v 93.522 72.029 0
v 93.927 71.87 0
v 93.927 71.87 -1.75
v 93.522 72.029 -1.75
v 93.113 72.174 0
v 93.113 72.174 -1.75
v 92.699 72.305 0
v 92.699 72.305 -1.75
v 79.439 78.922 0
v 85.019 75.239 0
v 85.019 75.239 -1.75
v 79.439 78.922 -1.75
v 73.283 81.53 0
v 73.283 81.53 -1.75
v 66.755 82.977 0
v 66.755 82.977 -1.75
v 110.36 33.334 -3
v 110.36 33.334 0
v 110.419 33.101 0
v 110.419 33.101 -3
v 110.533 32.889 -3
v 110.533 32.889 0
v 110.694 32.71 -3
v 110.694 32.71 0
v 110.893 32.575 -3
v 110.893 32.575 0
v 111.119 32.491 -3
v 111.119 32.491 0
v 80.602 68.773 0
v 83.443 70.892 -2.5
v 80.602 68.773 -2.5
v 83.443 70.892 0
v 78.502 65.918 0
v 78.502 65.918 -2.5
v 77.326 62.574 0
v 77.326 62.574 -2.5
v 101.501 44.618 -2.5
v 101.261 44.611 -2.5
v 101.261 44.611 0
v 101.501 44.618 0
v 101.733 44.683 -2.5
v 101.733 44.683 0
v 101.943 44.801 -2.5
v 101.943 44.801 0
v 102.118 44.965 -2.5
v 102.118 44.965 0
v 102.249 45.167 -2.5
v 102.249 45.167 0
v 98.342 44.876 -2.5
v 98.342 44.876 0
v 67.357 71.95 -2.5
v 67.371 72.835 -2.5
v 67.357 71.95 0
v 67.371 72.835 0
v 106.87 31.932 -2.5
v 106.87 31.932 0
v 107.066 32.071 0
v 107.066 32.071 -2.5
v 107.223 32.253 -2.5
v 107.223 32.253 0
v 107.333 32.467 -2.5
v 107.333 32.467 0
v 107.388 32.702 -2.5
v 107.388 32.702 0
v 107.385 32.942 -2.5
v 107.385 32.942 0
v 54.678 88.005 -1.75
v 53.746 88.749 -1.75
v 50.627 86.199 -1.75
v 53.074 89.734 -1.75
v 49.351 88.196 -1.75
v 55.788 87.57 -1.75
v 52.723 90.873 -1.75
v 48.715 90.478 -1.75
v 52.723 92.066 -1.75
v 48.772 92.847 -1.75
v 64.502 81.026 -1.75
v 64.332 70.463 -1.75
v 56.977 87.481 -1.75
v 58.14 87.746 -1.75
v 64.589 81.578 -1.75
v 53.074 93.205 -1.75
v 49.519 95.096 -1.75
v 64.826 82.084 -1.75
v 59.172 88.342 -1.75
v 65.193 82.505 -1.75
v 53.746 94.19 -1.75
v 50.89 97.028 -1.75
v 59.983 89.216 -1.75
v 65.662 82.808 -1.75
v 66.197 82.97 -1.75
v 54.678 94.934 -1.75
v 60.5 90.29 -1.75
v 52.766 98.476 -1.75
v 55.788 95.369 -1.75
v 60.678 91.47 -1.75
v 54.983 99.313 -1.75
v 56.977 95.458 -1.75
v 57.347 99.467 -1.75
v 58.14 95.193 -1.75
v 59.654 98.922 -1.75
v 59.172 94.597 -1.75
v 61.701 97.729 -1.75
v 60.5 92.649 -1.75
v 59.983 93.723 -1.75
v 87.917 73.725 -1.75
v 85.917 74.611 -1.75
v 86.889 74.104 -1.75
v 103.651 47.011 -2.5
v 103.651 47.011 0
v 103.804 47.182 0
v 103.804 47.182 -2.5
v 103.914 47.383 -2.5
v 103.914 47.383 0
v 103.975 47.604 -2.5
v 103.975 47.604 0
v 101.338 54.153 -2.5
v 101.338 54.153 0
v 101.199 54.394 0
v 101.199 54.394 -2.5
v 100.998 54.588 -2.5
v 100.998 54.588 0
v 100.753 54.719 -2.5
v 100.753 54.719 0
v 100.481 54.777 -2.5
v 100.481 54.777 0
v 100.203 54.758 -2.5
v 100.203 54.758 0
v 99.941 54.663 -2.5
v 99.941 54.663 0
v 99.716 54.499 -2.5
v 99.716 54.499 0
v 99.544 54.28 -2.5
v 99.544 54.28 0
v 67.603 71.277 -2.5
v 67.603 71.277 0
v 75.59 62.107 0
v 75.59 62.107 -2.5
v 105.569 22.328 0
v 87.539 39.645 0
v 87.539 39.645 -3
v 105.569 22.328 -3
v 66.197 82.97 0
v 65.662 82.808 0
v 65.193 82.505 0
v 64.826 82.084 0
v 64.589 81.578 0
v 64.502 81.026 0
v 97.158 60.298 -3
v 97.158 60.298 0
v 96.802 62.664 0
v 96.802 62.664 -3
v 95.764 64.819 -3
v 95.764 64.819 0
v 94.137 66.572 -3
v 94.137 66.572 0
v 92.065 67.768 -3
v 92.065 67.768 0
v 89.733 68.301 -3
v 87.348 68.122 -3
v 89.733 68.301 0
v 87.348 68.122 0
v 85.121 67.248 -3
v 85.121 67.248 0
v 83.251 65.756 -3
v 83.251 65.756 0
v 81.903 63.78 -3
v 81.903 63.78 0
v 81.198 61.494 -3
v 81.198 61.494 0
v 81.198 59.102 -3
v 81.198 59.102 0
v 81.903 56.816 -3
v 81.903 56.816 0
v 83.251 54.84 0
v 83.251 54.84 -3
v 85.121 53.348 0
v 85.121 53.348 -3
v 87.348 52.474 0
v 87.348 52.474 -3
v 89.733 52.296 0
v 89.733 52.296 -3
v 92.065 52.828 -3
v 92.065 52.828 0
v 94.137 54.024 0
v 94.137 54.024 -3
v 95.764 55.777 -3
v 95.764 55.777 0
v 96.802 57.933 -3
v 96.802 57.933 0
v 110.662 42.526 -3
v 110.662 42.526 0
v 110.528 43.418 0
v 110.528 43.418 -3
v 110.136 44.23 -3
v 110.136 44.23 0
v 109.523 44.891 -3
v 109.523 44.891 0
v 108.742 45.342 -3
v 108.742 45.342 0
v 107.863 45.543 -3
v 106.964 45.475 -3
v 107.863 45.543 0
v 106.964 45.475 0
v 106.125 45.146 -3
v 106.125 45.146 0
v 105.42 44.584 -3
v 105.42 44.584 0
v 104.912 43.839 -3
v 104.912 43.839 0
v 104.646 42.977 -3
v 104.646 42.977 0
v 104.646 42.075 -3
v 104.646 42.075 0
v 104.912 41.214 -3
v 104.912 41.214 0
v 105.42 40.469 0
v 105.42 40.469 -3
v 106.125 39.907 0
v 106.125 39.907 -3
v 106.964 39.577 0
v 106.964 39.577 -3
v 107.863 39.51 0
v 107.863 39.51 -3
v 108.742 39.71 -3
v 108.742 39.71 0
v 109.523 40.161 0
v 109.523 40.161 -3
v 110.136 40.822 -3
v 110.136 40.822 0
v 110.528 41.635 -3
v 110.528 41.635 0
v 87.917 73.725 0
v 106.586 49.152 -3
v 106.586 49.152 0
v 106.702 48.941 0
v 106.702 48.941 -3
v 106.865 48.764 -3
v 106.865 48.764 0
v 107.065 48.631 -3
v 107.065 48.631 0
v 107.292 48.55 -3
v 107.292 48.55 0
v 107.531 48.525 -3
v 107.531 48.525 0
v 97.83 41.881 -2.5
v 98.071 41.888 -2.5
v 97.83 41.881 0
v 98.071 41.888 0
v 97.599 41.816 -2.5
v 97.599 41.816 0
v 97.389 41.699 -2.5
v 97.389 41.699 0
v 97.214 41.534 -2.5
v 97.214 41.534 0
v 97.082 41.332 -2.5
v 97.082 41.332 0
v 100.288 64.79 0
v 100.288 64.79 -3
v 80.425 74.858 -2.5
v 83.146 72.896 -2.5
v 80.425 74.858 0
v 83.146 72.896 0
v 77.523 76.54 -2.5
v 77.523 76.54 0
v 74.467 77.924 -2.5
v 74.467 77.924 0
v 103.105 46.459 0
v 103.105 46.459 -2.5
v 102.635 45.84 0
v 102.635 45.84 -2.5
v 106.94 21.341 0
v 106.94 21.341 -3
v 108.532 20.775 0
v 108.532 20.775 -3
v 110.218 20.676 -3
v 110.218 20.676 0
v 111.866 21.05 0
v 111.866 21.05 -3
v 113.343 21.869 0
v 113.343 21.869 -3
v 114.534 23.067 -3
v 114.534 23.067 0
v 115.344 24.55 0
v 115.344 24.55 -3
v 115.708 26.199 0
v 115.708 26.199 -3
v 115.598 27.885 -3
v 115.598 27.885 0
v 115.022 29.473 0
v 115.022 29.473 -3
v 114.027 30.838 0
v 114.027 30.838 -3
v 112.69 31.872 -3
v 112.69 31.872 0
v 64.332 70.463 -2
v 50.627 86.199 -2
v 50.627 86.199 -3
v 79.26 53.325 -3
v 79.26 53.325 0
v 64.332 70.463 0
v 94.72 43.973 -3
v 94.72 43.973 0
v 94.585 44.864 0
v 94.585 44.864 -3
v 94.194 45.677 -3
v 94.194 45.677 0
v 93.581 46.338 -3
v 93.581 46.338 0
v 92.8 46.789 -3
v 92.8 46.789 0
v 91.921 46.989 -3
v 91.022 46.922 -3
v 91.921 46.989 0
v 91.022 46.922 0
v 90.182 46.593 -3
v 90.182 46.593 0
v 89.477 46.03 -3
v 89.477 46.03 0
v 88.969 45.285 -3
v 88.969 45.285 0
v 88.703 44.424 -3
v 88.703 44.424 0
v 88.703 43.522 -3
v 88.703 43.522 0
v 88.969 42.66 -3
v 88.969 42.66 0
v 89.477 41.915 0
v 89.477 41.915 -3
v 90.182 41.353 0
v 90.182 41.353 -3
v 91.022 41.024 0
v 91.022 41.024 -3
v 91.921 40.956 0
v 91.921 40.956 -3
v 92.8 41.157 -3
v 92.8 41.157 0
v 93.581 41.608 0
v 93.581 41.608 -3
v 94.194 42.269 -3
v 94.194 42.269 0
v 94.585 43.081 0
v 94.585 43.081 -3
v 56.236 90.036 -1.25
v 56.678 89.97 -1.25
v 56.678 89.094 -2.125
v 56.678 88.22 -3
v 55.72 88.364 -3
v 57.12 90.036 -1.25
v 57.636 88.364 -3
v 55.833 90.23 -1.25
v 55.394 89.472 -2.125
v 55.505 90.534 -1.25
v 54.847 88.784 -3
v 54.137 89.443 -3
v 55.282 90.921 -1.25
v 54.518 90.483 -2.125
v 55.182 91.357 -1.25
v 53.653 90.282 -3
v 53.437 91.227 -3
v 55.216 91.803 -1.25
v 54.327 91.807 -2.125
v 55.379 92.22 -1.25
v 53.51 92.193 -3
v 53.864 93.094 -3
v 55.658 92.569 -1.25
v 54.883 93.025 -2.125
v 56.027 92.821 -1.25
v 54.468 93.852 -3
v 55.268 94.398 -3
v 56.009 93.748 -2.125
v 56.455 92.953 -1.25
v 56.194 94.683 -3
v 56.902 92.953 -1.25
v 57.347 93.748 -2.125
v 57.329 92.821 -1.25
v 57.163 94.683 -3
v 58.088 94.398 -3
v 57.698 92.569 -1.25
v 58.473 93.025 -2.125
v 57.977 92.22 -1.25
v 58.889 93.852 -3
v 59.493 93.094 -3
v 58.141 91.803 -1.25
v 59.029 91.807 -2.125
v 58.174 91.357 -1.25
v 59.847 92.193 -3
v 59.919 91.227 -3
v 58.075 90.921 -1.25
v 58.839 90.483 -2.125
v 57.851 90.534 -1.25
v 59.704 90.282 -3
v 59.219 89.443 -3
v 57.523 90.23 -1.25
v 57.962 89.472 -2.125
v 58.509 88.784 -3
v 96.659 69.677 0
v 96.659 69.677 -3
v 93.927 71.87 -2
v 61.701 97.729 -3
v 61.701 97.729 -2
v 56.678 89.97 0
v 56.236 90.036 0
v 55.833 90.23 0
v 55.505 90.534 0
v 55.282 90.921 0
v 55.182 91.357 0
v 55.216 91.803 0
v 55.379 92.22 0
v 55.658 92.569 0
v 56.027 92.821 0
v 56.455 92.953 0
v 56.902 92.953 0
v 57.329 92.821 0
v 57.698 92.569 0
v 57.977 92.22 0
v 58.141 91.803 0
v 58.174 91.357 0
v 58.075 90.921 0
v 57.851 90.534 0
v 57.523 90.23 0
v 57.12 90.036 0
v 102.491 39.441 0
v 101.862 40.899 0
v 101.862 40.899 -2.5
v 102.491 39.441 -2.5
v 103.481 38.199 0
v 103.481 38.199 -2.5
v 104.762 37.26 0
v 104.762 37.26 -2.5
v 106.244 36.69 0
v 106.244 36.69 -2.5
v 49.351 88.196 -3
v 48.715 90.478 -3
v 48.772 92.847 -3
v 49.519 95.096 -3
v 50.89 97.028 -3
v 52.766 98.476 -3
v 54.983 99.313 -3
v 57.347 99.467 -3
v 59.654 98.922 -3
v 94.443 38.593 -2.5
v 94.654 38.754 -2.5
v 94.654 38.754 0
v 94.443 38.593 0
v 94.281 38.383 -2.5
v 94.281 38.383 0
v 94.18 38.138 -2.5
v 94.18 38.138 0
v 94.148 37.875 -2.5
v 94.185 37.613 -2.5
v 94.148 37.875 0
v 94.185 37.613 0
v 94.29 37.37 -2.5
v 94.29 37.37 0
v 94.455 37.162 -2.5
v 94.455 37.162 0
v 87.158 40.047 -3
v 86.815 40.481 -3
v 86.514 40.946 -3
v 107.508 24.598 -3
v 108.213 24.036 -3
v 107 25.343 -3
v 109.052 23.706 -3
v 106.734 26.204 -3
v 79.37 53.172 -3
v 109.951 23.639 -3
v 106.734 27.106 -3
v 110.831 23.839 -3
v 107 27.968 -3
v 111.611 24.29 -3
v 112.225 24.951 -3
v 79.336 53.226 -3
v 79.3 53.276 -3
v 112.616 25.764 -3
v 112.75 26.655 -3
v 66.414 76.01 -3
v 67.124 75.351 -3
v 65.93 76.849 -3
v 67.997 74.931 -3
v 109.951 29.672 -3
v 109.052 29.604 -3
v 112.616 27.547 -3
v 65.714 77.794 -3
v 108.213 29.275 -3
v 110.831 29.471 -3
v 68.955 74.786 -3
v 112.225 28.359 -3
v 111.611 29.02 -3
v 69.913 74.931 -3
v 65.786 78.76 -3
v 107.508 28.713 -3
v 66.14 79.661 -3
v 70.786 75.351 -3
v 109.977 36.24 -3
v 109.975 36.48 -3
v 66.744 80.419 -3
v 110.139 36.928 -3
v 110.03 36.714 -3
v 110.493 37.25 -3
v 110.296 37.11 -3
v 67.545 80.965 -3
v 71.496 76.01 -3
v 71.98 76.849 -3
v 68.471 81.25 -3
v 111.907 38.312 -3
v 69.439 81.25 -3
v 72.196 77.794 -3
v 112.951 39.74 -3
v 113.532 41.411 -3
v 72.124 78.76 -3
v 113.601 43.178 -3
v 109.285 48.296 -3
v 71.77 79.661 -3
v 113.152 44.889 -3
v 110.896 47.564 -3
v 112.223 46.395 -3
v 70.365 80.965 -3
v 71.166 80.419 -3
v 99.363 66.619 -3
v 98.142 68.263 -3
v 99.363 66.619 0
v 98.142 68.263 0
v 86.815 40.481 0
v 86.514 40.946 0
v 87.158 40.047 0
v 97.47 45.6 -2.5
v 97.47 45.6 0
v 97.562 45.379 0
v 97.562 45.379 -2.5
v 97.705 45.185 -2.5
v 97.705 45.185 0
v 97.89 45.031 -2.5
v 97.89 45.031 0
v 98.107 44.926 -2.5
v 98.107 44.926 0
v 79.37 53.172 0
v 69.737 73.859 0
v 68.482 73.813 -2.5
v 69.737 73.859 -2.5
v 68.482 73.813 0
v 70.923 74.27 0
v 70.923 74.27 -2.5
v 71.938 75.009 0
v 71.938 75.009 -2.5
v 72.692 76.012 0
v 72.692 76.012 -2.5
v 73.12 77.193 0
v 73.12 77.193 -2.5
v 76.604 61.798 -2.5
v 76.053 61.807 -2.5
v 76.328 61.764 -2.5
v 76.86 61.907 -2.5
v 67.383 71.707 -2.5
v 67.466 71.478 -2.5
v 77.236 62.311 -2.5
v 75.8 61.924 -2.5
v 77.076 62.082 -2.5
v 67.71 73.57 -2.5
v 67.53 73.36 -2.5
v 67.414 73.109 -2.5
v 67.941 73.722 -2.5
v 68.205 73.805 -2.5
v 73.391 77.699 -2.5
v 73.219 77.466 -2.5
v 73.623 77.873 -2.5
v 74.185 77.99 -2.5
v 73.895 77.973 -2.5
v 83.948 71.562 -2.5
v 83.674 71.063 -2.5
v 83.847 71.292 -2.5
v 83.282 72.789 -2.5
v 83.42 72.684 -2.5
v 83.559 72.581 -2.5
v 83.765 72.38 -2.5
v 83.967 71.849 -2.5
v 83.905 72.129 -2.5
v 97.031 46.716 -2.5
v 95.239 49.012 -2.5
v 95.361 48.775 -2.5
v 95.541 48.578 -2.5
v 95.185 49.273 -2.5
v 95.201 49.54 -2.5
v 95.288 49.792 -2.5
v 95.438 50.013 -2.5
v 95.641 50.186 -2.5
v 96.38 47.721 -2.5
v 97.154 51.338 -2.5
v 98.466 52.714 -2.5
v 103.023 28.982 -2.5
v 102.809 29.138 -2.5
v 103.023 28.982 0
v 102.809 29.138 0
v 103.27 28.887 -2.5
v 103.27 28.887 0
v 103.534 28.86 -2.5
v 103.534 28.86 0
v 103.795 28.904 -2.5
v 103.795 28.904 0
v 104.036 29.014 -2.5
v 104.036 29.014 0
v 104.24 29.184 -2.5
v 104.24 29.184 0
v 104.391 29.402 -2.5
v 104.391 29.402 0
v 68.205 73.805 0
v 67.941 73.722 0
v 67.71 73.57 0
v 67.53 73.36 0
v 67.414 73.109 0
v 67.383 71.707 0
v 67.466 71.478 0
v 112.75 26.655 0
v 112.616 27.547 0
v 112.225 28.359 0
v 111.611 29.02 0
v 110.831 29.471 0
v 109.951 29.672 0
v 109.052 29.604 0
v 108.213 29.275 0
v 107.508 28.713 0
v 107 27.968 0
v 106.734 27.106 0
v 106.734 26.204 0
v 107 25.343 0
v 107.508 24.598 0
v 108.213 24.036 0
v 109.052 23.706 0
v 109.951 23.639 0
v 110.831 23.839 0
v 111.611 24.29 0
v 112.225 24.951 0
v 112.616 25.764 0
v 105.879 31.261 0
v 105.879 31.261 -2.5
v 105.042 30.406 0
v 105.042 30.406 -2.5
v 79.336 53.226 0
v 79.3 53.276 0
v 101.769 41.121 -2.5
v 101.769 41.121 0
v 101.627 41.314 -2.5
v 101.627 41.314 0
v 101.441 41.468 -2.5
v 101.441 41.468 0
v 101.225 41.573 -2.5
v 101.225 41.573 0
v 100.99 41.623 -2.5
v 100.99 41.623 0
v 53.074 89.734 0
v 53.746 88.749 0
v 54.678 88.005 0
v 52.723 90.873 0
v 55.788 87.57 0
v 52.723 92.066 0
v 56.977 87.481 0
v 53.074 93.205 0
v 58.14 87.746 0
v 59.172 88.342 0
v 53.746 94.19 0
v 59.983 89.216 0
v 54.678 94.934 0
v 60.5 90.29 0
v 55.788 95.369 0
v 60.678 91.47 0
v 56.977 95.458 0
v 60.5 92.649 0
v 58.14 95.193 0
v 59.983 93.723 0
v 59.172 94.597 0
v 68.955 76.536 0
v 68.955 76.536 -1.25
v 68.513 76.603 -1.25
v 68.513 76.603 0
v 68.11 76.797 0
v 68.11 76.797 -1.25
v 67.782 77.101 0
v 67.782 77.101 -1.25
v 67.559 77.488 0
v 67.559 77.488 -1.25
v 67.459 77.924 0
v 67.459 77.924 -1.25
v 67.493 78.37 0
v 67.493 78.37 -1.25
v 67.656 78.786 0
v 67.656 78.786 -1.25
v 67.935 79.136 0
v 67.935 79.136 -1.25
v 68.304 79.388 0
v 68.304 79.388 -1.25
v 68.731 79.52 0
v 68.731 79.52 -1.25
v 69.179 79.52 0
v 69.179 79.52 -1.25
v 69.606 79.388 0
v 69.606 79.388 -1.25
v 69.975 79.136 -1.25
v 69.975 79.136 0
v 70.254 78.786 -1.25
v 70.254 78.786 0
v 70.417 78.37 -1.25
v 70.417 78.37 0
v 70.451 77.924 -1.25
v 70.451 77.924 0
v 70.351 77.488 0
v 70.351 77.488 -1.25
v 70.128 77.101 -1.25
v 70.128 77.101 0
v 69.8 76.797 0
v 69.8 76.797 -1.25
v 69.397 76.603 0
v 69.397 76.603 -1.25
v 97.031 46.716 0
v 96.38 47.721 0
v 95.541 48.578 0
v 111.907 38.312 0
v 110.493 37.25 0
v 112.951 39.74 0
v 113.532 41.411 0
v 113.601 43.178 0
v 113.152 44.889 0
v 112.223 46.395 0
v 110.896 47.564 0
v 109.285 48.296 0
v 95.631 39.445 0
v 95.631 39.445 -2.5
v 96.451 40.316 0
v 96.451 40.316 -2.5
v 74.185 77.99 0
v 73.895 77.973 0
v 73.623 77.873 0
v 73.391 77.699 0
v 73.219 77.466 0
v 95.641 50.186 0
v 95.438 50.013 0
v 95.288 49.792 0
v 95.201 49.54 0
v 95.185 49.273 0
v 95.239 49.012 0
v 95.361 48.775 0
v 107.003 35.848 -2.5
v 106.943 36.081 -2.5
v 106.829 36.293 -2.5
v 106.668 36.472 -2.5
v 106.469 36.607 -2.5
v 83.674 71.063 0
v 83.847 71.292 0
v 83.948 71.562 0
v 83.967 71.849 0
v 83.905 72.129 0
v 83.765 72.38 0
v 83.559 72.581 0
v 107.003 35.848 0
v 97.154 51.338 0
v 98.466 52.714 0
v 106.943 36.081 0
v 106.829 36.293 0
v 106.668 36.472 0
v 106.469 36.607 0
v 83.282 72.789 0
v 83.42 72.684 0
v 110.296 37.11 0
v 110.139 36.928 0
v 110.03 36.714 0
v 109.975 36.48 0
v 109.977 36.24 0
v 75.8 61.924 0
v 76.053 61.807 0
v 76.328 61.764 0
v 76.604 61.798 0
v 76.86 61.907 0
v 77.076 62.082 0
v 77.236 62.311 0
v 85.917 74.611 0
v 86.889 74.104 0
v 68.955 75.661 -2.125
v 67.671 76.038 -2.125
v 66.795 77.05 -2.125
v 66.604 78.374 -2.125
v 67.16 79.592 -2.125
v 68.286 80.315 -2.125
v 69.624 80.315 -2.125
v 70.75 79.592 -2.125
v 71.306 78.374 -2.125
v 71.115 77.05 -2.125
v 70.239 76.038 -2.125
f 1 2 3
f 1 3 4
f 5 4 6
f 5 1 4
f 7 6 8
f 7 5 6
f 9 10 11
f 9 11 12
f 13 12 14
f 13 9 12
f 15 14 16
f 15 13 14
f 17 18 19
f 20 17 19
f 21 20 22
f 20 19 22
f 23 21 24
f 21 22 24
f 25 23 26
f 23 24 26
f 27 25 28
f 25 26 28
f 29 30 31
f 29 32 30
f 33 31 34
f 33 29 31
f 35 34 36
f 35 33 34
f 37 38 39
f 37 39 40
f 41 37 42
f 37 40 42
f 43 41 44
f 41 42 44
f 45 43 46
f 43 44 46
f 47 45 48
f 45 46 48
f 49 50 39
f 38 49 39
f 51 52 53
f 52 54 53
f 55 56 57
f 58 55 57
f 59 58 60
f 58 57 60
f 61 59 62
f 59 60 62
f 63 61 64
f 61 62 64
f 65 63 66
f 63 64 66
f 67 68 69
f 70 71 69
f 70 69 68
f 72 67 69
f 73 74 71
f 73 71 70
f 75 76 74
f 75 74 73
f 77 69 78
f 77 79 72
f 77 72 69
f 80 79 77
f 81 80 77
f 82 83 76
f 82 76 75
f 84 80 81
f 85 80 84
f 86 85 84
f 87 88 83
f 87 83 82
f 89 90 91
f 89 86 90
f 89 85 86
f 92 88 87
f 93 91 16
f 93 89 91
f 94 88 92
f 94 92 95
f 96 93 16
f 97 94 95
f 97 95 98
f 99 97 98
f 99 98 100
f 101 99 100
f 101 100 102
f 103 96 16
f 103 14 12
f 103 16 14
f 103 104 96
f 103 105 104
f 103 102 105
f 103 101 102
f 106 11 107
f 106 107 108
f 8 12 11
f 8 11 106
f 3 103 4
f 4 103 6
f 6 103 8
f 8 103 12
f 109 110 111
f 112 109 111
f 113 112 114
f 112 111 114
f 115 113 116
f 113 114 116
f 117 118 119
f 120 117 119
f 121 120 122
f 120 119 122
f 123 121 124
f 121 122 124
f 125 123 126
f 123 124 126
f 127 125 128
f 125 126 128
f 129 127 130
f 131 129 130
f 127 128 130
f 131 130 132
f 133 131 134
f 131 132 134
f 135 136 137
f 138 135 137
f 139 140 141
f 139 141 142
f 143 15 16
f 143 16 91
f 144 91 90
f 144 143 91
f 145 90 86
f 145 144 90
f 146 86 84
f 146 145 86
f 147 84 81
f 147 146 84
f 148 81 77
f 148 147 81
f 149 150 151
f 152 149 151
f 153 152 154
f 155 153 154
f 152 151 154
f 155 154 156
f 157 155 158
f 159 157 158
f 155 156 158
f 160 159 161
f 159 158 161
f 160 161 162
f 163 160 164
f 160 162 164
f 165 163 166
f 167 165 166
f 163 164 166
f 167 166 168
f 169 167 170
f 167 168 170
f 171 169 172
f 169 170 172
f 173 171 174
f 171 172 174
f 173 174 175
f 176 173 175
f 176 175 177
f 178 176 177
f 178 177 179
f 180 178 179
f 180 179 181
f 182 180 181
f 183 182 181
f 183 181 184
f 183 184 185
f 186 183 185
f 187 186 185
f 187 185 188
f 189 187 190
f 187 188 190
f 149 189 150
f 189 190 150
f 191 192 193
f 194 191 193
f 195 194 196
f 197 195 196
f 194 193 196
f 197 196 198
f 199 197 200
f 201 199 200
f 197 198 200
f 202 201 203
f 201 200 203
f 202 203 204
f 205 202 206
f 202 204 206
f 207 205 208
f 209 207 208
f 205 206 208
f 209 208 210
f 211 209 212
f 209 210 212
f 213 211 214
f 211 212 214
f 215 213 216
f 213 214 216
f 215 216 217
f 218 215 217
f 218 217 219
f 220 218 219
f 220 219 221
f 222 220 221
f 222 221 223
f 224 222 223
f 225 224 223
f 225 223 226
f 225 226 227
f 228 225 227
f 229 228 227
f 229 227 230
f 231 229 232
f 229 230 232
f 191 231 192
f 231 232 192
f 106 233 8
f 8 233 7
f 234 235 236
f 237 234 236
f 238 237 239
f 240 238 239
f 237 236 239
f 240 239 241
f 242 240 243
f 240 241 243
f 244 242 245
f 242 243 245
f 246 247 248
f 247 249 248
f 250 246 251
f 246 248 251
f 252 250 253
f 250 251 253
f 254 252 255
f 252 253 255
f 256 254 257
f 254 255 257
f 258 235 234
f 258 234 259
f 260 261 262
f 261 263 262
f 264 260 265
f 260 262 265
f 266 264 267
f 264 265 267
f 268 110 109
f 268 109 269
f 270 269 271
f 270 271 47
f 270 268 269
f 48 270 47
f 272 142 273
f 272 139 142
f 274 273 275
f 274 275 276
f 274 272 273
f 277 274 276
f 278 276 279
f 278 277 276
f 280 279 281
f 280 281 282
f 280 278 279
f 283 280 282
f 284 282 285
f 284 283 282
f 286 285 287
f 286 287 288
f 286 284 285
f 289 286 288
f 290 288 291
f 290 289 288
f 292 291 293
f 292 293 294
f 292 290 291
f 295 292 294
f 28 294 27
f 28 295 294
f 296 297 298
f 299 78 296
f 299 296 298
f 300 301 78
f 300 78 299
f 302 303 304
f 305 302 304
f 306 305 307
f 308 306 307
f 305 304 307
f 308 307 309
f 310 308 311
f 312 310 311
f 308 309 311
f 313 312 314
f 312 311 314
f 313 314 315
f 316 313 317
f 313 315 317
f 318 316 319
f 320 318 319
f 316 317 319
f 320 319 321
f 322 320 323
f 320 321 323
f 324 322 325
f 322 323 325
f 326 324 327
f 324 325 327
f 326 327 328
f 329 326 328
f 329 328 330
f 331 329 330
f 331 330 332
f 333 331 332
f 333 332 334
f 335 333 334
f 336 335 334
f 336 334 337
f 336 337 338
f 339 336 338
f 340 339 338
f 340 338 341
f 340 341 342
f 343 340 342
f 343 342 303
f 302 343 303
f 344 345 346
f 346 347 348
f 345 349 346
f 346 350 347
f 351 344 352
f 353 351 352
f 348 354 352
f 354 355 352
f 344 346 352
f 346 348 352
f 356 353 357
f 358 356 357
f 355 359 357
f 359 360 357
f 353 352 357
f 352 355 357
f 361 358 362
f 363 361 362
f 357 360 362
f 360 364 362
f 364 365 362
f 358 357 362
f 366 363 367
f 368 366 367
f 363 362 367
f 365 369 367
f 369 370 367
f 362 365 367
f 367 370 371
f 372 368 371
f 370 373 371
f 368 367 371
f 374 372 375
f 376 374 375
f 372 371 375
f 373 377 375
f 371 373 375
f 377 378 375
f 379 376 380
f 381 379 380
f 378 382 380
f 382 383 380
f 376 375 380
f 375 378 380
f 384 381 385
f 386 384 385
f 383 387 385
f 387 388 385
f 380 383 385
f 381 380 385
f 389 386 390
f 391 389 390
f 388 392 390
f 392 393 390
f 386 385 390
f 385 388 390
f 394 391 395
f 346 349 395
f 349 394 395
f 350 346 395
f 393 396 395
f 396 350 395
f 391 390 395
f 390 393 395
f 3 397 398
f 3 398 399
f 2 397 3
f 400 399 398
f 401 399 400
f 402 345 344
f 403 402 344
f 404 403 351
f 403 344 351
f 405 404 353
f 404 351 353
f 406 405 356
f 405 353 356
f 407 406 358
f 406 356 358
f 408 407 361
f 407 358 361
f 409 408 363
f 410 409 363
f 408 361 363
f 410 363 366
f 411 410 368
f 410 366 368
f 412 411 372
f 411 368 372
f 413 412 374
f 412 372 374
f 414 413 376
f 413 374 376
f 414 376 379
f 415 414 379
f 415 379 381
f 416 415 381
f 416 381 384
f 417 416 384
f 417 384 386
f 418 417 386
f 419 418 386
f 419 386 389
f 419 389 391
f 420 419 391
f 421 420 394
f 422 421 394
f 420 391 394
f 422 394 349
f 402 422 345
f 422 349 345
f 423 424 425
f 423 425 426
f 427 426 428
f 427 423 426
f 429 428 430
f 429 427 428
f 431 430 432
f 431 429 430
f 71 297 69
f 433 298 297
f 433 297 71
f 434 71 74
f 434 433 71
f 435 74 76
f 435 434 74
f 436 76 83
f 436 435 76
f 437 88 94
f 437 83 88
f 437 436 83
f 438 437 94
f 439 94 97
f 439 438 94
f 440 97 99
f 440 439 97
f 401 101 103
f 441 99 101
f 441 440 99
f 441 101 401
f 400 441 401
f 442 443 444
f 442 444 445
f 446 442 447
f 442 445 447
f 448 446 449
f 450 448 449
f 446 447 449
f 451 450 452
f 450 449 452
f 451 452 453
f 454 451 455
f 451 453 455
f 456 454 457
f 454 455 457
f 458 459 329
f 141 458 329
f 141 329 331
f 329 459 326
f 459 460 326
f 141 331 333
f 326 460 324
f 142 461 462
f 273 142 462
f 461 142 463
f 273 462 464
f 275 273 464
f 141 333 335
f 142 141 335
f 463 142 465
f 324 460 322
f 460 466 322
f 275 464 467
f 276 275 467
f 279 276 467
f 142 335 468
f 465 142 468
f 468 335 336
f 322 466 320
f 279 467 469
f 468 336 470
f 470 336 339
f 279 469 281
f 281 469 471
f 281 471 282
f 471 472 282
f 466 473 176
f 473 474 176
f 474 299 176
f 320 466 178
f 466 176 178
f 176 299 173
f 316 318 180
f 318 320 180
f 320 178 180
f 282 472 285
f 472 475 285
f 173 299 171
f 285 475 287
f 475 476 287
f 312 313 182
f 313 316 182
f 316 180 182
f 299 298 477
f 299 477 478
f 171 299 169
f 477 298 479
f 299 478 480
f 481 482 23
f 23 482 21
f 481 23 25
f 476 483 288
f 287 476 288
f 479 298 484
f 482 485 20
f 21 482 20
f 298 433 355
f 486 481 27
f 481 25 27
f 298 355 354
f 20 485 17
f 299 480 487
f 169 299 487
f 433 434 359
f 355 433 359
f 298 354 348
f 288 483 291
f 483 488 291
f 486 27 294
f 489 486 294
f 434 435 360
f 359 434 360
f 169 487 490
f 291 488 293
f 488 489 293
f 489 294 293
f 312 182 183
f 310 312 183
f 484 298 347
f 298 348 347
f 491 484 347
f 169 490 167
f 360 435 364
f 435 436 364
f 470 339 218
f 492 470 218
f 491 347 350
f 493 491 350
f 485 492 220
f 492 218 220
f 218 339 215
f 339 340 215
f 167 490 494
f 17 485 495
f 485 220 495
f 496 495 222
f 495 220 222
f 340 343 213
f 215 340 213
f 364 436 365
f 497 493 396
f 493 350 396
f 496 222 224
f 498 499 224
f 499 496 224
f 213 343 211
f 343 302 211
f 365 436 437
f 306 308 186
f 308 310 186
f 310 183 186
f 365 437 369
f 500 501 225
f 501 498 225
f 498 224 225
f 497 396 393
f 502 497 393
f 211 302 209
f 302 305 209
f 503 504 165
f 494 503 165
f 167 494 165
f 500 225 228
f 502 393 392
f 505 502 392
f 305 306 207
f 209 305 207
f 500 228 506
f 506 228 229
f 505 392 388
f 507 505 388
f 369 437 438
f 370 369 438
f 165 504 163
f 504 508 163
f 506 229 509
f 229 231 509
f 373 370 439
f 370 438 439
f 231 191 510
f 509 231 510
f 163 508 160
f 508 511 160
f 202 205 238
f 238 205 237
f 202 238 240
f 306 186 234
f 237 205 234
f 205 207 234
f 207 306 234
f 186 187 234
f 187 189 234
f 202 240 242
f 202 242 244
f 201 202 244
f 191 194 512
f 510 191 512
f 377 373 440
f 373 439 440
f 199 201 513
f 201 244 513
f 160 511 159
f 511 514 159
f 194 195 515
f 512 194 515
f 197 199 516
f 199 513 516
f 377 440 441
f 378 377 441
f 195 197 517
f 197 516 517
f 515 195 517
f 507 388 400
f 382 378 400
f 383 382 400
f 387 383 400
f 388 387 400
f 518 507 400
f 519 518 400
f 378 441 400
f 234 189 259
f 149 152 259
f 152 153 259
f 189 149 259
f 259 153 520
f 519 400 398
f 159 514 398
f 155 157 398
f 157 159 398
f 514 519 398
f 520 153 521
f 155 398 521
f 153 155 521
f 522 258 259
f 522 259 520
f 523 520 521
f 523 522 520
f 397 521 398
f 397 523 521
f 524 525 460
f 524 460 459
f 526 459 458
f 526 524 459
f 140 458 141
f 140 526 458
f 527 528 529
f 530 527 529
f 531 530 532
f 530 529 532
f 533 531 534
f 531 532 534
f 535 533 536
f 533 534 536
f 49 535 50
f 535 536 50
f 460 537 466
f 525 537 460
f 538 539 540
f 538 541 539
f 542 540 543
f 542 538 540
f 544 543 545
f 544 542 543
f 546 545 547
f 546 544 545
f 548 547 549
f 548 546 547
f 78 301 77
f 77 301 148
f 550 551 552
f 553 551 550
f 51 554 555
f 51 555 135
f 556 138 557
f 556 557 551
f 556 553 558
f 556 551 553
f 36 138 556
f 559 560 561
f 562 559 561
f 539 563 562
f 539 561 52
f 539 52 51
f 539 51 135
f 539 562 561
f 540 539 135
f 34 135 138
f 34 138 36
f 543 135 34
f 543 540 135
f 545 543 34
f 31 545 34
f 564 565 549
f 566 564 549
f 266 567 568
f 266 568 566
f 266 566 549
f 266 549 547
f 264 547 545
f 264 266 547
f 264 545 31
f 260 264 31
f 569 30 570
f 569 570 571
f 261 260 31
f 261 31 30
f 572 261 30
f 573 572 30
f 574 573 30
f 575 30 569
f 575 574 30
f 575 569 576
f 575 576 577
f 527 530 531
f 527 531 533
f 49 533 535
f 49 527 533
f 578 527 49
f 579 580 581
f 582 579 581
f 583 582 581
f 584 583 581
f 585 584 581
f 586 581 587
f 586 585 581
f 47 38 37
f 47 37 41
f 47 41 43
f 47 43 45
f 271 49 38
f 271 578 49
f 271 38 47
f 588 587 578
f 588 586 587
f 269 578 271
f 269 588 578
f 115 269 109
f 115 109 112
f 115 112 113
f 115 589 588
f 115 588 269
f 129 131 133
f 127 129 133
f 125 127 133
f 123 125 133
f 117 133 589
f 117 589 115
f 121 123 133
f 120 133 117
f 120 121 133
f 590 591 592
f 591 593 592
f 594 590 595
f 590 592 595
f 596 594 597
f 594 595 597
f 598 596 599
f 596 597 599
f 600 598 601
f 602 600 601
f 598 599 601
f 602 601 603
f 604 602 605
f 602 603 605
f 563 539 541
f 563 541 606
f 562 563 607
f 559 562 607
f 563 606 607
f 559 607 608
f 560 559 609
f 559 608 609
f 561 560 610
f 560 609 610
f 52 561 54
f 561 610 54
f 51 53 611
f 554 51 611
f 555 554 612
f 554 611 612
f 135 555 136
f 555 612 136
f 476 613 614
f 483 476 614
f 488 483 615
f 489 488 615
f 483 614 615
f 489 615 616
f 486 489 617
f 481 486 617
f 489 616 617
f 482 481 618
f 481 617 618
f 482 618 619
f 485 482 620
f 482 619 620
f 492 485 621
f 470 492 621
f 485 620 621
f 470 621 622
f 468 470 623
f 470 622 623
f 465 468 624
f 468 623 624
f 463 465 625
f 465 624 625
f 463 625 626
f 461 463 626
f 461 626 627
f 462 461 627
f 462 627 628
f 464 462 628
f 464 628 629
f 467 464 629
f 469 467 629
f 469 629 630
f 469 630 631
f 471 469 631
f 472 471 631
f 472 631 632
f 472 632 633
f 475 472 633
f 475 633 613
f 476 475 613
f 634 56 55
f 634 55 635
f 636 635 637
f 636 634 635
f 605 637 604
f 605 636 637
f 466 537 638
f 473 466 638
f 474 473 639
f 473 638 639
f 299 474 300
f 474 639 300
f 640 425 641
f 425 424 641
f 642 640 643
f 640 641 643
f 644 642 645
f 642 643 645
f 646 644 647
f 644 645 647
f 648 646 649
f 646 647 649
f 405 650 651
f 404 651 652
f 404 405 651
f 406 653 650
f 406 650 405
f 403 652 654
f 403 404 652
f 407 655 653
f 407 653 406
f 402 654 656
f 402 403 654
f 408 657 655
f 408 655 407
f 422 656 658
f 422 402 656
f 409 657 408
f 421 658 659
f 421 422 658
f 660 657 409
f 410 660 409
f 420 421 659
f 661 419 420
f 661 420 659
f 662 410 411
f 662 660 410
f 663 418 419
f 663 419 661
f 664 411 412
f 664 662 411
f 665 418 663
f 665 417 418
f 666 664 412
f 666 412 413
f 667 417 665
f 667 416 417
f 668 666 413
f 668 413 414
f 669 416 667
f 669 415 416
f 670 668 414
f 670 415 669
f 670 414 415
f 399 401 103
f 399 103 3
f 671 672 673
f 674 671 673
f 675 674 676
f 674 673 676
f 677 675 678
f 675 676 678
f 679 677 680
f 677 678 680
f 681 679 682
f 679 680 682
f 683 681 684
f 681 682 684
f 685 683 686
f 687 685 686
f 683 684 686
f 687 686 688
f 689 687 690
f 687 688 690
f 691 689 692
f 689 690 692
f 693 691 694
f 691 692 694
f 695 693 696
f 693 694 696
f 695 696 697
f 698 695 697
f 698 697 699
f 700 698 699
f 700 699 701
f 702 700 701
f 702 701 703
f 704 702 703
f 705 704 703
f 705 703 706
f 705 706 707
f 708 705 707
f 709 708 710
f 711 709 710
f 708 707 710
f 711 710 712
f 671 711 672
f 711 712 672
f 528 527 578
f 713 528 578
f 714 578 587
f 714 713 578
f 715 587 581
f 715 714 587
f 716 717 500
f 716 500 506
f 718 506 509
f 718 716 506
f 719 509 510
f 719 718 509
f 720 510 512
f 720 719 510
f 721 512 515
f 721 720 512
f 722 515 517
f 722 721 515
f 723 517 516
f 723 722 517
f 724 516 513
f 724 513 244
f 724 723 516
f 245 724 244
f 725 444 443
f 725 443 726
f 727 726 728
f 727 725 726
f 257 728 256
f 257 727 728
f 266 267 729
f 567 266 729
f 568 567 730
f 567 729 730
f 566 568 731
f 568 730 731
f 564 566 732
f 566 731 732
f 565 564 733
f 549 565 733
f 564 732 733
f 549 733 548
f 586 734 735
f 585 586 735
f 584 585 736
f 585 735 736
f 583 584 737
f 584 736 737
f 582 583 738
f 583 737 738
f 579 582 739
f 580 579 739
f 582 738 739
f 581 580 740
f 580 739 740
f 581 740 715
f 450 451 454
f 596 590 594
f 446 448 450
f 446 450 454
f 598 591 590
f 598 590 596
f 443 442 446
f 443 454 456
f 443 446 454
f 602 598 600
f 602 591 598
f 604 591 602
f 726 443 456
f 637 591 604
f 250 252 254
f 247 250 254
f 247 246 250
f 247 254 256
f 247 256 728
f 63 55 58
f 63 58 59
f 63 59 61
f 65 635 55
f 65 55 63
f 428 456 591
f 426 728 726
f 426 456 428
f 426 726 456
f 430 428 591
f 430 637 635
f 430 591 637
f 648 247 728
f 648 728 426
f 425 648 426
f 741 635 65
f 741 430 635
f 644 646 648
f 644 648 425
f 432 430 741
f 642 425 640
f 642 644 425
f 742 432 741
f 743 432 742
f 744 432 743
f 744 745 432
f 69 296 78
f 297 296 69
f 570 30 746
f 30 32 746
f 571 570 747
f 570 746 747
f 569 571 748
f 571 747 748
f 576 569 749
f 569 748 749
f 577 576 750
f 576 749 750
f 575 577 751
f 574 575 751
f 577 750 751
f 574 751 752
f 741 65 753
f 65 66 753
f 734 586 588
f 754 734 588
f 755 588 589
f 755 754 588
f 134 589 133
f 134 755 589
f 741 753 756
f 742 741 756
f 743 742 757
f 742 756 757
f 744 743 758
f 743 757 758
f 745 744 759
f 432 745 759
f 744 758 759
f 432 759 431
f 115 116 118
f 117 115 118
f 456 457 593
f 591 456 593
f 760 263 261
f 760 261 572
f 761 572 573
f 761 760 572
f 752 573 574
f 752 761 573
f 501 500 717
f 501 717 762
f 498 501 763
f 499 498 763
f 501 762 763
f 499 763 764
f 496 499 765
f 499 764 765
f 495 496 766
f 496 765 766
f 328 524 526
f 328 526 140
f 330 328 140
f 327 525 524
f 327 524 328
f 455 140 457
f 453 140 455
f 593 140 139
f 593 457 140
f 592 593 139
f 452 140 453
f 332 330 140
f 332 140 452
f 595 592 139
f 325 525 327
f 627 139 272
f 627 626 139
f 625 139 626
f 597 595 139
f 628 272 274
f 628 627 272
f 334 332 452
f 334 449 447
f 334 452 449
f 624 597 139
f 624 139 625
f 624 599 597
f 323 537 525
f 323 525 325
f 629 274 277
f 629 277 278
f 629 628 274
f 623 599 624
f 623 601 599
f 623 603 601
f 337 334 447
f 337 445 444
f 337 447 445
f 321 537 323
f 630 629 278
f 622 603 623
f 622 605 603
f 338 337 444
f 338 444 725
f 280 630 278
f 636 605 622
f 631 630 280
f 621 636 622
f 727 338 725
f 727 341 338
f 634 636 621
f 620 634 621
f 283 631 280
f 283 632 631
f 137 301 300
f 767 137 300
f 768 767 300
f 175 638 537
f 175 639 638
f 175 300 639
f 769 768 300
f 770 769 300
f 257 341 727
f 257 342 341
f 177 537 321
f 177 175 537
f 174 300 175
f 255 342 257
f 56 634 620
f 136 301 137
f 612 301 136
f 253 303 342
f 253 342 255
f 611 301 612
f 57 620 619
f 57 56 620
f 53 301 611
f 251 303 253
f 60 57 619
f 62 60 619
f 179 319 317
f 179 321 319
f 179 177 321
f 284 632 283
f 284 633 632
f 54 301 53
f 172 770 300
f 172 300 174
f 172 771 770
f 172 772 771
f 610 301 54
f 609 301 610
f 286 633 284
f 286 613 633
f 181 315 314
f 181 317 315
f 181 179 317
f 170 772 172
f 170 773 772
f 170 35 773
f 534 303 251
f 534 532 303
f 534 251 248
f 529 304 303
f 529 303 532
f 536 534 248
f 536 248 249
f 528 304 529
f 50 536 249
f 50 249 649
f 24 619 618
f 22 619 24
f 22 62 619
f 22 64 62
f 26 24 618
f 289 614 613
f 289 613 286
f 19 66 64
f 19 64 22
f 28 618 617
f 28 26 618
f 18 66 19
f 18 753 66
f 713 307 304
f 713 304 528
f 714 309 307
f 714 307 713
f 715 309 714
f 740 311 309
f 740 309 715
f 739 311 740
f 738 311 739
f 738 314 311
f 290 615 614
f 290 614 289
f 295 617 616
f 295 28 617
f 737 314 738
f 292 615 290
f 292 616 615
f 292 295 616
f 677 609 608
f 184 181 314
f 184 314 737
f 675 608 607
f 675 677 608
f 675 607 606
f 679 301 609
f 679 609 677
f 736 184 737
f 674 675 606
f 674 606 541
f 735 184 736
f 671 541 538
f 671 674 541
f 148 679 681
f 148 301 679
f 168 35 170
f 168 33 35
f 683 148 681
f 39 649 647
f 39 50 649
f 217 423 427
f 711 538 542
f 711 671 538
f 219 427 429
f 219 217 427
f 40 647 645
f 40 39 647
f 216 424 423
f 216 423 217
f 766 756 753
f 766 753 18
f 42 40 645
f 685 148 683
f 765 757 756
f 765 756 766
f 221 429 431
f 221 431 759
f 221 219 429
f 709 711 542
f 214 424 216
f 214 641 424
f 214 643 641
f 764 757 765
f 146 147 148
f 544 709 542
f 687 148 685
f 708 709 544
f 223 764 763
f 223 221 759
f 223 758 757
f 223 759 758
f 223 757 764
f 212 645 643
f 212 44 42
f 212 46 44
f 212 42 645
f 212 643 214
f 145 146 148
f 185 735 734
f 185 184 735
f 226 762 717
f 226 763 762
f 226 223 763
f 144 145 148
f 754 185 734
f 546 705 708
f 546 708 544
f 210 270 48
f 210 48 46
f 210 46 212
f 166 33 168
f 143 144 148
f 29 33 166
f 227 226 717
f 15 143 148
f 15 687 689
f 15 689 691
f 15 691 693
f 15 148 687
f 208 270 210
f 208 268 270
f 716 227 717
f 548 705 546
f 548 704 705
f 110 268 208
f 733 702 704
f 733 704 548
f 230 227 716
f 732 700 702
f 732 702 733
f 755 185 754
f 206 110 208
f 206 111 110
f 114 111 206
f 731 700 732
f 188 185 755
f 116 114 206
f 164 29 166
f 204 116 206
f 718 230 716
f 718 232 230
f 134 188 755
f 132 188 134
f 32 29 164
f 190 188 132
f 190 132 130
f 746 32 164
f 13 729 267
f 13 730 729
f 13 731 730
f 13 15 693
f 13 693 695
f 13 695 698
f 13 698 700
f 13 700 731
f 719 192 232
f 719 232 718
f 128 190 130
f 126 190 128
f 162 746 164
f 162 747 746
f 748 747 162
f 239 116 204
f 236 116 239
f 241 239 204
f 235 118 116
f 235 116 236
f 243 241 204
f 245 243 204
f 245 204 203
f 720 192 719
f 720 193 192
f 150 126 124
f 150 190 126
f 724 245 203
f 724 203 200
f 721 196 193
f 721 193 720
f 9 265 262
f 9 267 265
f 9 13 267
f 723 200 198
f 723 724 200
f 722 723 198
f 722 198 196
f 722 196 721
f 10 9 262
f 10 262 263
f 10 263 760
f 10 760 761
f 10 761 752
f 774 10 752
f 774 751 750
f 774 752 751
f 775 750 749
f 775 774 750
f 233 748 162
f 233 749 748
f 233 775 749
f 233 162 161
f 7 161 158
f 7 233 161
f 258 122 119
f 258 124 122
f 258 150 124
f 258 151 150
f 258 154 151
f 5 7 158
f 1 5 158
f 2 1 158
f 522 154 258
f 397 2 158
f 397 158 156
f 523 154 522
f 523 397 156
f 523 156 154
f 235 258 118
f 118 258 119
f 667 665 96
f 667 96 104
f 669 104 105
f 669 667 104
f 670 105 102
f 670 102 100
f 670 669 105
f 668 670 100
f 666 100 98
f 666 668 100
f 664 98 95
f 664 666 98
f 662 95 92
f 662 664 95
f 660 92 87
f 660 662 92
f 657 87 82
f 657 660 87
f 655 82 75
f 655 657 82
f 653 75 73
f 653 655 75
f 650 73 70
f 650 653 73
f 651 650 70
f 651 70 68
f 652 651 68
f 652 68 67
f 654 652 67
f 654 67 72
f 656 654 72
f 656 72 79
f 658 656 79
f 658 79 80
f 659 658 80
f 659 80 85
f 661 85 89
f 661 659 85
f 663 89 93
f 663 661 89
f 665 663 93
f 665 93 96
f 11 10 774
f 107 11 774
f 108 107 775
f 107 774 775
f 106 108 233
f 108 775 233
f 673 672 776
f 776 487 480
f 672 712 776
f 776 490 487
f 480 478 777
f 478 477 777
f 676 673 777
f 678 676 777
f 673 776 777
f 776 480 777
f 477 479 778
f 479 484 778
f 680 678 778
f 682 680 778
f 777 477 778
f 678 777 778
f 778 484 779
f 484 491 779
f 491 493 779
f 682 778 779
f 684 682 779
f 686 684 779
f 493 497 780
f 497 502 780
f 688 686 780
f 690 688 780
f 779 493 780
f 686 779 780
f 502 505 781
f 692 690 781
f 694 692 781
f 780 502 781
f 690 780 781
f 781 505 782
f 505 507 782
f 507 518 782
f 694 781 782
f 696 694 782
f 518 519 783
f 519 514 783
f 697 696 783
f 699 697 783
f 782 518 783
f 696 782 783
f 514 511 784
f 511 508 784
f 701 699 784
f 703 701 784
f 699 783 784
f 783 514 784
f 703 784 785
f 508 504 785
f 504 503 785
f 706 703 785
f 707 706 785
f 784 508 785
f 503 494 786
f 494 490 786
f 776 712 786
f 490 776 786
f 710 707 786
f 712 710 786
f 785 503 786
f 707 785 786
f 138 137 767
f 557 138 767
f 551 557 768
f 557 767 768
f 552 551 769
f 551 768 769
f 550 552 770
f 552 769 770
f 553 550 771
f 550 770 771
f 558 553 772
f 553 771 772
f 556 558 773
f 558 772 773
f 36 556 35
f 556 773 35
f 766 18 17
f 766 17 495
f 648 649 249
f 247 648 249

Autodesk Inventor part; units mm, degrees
ref_plane "YZ Plane" through (0, 0, 0) normal (1, 0, 0) x (0, 1, 0)
ref_plane "XZ Plane" through (0, 0, 0) normal (0, 1, 0) x (-1, 0, 0)
ref_plane "XY Plane" through (0, 0, 0) normal (0, 0, 1) x (1, 0, 0)
sketch "スケッチ1" plane through (0, 0, 0) normal (0, 0, 1) x (1, 0, 0)
  circle A0 centre (89.1334, 60.2981) radius 8.025
  arc A1 (110.4927, 37.2495) -> (107.5312, 48.5254) centre (107.6371, 42.5263) ccw
  arc A2 (106.5859, 49.1517) -> (107.5312, 48.5254) centre (107.5135, 49.5253) ccw
  line L0 (106.5859, 49.1517) -> (100.2878, 64.7903)
  arc A3 (100.2878, 64.7903) -> (96.6592, 69.6769) centre (89.1334, 60.2981) ccw
  line L1 (96.6592, 69.6769) -> (61.7006, 97.7286)
  arc A4 (61.7006, 97.7286) -> (50.6268, 86.1987) centre (56.6782, 91.4695) ccw
  line L2 (50.6268, 86.1987) -> (79.2604, 53.3248)
  arc A5 (79.3697, 53.1725) -> (79.2604, 53.3248) centre (78.5063, 52.668) ccw
  line L3 (79.3697, 53.1725) -> (86.5144, 40.9457)
  arc A6 (86.5144, 40.9457) -> (87.5386, 39.6454) centre (91.6947, 43.9728) ccw
  line L4 (87.5386, 39.6454) -> (105.5692, 22.328)
  arc A7 (105.5692, 22.328) -> (111.1188, 32.4913) centre (109.7254, 26.6553) ccw
  arc A8 (110.3596, 33.3335) -> (111.1188, 32.4913) centre (111.3511, 33.464) ccw
  line L5 (110.3596, 33.3335) -> (109.9772, 36.2396)
  arc A9 (110.4927, 37.2495) -> (109.9772, 36.2396) centre (110.9687, 36.37) ccw
  circle A10 centre (68.955, 78.0364) radius 1.25
  circle A11 centre (109.7254, 26.6553) radius 3.025
  circle A12 centre (107.6371, 42.5263) radius 3.025
  circle A13 centre (91.6947, 43.9728) radius 3.025
  circle A14 centre (56.6782, 91.4695) radius 1.25
  arc A15 (83.1457, 72.8964) -> (83.5589, 72.581) centre (90.3437, 81.8972) ccw
  arc A16 (83.1457, 72.8964) -> (74.4673, 77.9243) centre (62.1124, 46.5952) ccw
  arc A17 (74.4673, 77.9243) -> (73.1203, 77.1926) centre (74.1004, 76.994) ccw
  arc A18 (68.4822, 73.8128) -> (73.1203, 77.1926) centre (68.955, 78.0364) ccw
  arc A19 (68.4822, 73.8128) -> (67.371, 72.8351) centre (68.3709, 72.819) ccw
  line L6 (67.371, 72.8351) -> (67.3568, 71.9495)
  arc A20 (67.3568, 71.9495) -> (67.6026, 71.2766) centre (68.3567, 71.9334) ccw
  line L7 (67.6026, 71.2766) -> (75.5898, 62.1066)
  arc A21 (75.5898, 62.1066) -> (77.3258, 62.5741) centre (76.3438, 62.7634) ccw
  arc A22 (83.4434, 70.8917) -> (77.3258, 62.5741) centre (89.1334, 60.2981) ccw
  arc A23 (83.4434, 70.8917) -> (83.5589, 72.581) centre (82.9702, 71.7727) ccw
  arc A24 (97.4697, 45.6005) -> (95.5411, 48.5777) centre (91.6947, 43.9728) ccw
  arc A25 (97.4697, 45.6005) -> (98.3419, 44.8759) centre (98.4322, 45.8718) ccw
  line L8 (98.3419, 44.8759) -> (101.261, 44.611)
  arc A26 (101.261, 44.611) -> (102.2493, 45.1668) centre (101.3514, 45.6069) ccw
  arc A27 (103.6511, 47.011) -> (102.2493, 45.1668) centre (107.6371, 42.5263) ccw
  arc A28 (103.6511, 47.011) -> (103.9749, 47.6045) centre (102.9868, 47.7585) ccw
  line L9 (103.9749, 47.6045) -> (101.3375, 54.1532)
  arc A29 (101.3375, 54.1532) -> (99.5442, 54.2801) centre (100.4099, 53.7796) ccw
  arc A30 (95.641, 50.1861) -> (99.5442, 54.2801) centre (89.1334, 60.2981) ccw
  arc A31 (95.641, 50.1861) -> (95.5411, 48.5777) centre (96.1822, 49.3452) ccw
  circle A32 centre (89.1334, 60.2981) radius 8.025
  arc A33 (110.4927, 37.2495) -> (107.5312, 48.5254) centre (107.6371, 42.5263) ccw
  arc A34 (110.4927, 37.2495) -> (109.9772, 36.2396) centre (110.9687, 36.37) ccw
  line L10 (109.9772, 36.2396) -> (110.3596, 33.3335)
  arc A35 (110.3596, 33.3335) -> (111.1188, 32.4913) centre (111.3511, 33.464) ccw
  arc A36 (105.5692, 22.328) -> (111.1188, 32.4913) centre (109.7254, 26.6553) ccw
  line L11 (105.5692, 22.328) -> (87.5386, 39.6454)
  arc A37 (86.5144, 40.9457) -> (87.5386, 39.6454) centre (91.6947, 43.9728) ccw
  line L12 (86.5144, 40.9457) -> (79.3697, 53.1725)
  arc A38 (79.3697, 53.1725) -> (79.2604, 53.3248) centre (78.5063, 52.668) ccw
  line L13 (79.2604, 53.3248) -> (64.3325, 70.4633)
  line L14 (64.3325, 70.4633) -> (64.5025, 81.0256)
  arc A39 (66.7554, 82.9773) -> (64.5025, 81.0256) centre (66.5022, 80.9934) ccw
  arc A40 (85.0194, 75.2394) -> (66.7554, 82.9773) centre (62.1124, 46.5952) ccw
  arc A41 (85.0194, 75.2394) -> (87.9169, 73.7249) centre (90.3437, 81.8972) ccw
  line L15 (87.9169, 73.7249) -> (92.6989, 72.3049)
  arc A42 (93.9266, 71.8696) -> (92.6989, 72.3049) centre (89.1334, 60.2981) ccw
  line L16 (93.9266, 71.8696) -> (96.6592, 69.6769)
  arc A43 (100.2878, 64.7903) -> (96.6592, 69.6769) centre (89.1334, 60.2981) ccw
  line L17 (100.2878, 64.7903) -> (106.5859, 49.1517)
  arc A44 (106.5859, 49.1517) -> (107.5312, 48.5254) centre (107.5135, 49.5253) ccw
  line L18 (107.3853, 32.9421) -> (107.0029, 35.8482)
  arc A45 (107.0029, 35.8482) -> (106.2437, 36.6904) centre (106.0114, 35.7177) ccw
  arc A46 (101.8621, 40.8987) -> (106.2437, 36.6904) centre (107.6371, 42.5263) ccw
  arc A47 (101.8621, 40.8987) -> (100.9899, 41.6233) centre (100.8996, 40.6274) ccw
  line L19 (100.9899, 41.6233) -> (98.0708, 41.8881)
  arc A48 (98.0708, 41.8881) -> (97.0825, 41.3323) centre (97.9804, 40.8922) ccw
  arc A49 (94.6542, 38.7535) -> (97.0825, 41.3323) centre (91.6947, 43.9728) ccw
  arc A50 (94.6542, 38.7535) -> (94.4548, 37.1624) centre (95.1475, 37.8836) ccw
  line L20 (94.4548, 37.1624) -> (102.8092, 29.1384)
  arc A51 (102.8092, 29.1384) -> (104.391, 29.4019) centre (103.5019, 29.8597) ccw
  arc A52 (106.8698, 31.9322) -> (104.391, 29.4019) centre (109.7254, 26.6553) ccw
  arc A53 (106.8698, 31.9322) -> (107.3853, 32.9421) centre (106.3938, 32.8117) ccw
  circle A54 centre (107.6371, 42.5263) radius 3.025
  circle A55 centre (68.955, 78.0364) radius 1.25
  circle A56 centre (91.6947, 43.9728) radius 3.025
  circle A57 centre (109.7254, 26.6553) radius 3.025
  line L21 (61.7006, 97.7286) -> (93.9266, 71.8696)
  arc A58 (93.9266, 71.8696) -> (92.6989, 72.3049) centre (89.1334, 60.2981) ccw
  line L22 (87.9169, 73.7249) -> (92.6989, 72.3049)
  arc A59 (85.0194, 75.2394) -> (87.9169, 73.7249) centre (90.3437, 81.8972) ccw
  arc A60 (85.0194, 75.2394) -> (66.7554, 82.9773) centre (62.1124, 46.5952) ccw
  arc A61 (66.7554, 82.9773) -> (64.5025, 81.0256) centre (66.5022, 80.9934) ccw
  line L23 (64.3325, 70.4633) -> (64.5025, 81.0256)
  line L24 (64.3325, 70.4633) -> (50.6268, 86.1987)
  arc A62 (61.7006, 97.7286) -> (50.6268, 86.1987) centre (56.6782, 91.4695) ccw
  circle A63 centre (56.6782, 91.4695) radius 4
  point P0 (0, 0)
  point P1 (0, 0)
extrude "押し出し1" add sketch "スケッチ1" against normal blind 3 contours A9 L5 A8 A7 L4 A6 L3 A5 L2 L14 A39 A40 A41 L15 A42 L1 A3 L0 A2 A1 | A42 L15 A41 A40 A39 L14 L2 A4 L1 | A15 A23 A22 A21 L7 A20 L6 A19 A18 A17 A16 | A24 A31 A30 A29 L9 A28 A27 A26 L8 A25 | A53 A52 A51 L20 A50 A49 A48 L19 A47 A46 A45 L18 | A63
extrude "押し出し2" cut sketch "スケッチ1" against normal blind 2 contours A42 L15 A41 A40 A39 L14 L2 A4 L1
extrude "押し出し3" cut sketch "スケッチ1" against normal blind 2.5 contours A15 A23 A22 A21 L7 A20 L6 A19 A18 A17 A16 | A24 A31 A30 A29 L9 A28 A27 A26 L8 A25 | A53 A52 A51 L20 A50 A49 A48 L19 A47 A46 A45 L18
hole "穴1" at (68.955, 78.0364, 0) at (56.6782, 91.4695, 0) direction (0, 0, -1) diameter 3 depth 12 tip angle 118
sketch "スケッチ2" plane through (0, 0, -2) normal (0, 0, 1) x (1, 0, 0)
  circle A0 centre (68.955, 78.0364) radius 1.5 projected
  circle A1 centre (56.6782, 91.4695) radius 1.5 projected
  arc A2 (94.6542, 38.7535) -> (94.4548, 37.1624) centre (95.1475, 37.8836) ccw projected
  line L0 (94.4548, 37.1624) -> (102.8092, 29.1384) projected
  arc A3 (102.8092, 29.1384) -> (104.391, 29.4019) centre (103.5019, 29.8597) ccw projected
  arc A4 (106.8698, 31.9322) -> (104.391, 29.4019) centre (109.7254, 26.6553) ccw projected
  arc A5 (106.8698, 31.9322) -> (107.3853, 32.9421) centre (106.3938, 32.8117) ccw projected
  line L1 (107.3853, 32.9421) -> (107.0029, 35.8482) projected
  arc A6 (107.0029, 35.8482) -> (106.2437, 36.6904) centre (106.0114, 35.7177) ccw projected
  arc A7 (101.8621, 40.8987) -> (106.2437, 36.6904) centre (107.6371, 42.5263) ccw projected
  arc A8 (101.8621, 40.8987) -> (100.9899, 41.6233) centre (100.8996, 40.6274) ccw projected
  line L2 (100.9899, 41.6233) -> (98.0708, 41.8881) projected
  arc A9 (98.0708, 41.8881) -> (97.0825, 41.3323) centre (97.9804, 40.8922) ccw projected
  arc A10 (94.6542, 38.7535) -> (97.0825, 41.3323) centre (91.6947, 43.9728) ccw projected
  arc A11 (95.641, 50.1861) -> (95.5411, 48.5777) centre (96.1822, 49.3452) ccw projected
  arc A12 (97.4697, 45.6005) -> (95.5411, 48.5777) centre (91.6947, 43.9728) ccw projected
  arc A13 (97.4697, 45.6005) -> (98.3419, 44.8759) centre (98.4322, 45.8718) ccw projected
  line L3 (98.3419, 44.8759) -> (101.261, 44.611) projected
  arc A14 (101.261, 44.611) -> (102.2493, 45.1668) centre (101.3514, 45.6069) ccw projected
  arc A15 (103.6511, 47.011) -> (102.2493, 45.1668) centre (107.6371, 42.5263) ccw projected
  arc A16 (103.6511, 47.011) -> (103.9749, 47.6045) centre (102.9868, 47.7585) ccw projected
  line L4 (103.9749, 47.6045) -> (101.3375, 54.1532) projected
  arc A17 (101.3375, 54.1532) -> (99.5442, 54.2801) centre (100.4099, 53.7796) ccw projected
  arc A18 (95.641, 50.1861) -> (99.5442, 54.2801) centre (89.1334, 60.2981) ccw projected
  line L5 (67.371, 72.8351) -> (67.3568, 71.9495) projected
  arc A19 (67.3568, 71.9495) -> (67.6026, 71.2766) centre (68.3567, 71.9334) ccw projected
  line L6 (67.6026, 71.2766) -> (75.5898, 62.1066) projected
  arc A20 (75.5898, 62.1066) -> (77.3258, 62.5741) centre (76.3438, 62.7634) ccw projected
  arc A21 (83.4434, 70.8917) -> (77.3258, 62.5741) centre (89.1334, 60.2981) ccw projected
  arc A22 (83.4434, 70.8917) -> (83.5589, 72.581) centre (82.9702, 71.7727) ccw projected
  arc A23 (83.1457, 72.8964) -> (83.5589, 72.581) centre (90.3437, 81.8972) ccw projected
  arc A24 (83.1457, 72.8964) -> (74.4673, 77.9243) centre (62.1124, 46.5952) ccw projected
  arc A25 (74.4673, 77.9243) -> (73.1203, 77.1926) centre (74.1004, 76.994) ccw projected
  arc A26 (68.4822, 73.8128) -> (73.1203, 77.1926) centre (68.955, 78.0364) ccw projected
  arc A27 (68.4822, 73.8128) -> (67.371, 72.8351) centre (68.3709, 72.819) ccw projected
  circle A28 centre (56.6782, 91.4695) radius 4 projected
  line L7 (64.3325, 70.4633) -> (64.5025, 81.0256) projected
  arc A29 (66.7554, 82.9773) -> (64.5025, 81.0256) centre (66.5022, 80.9934) ccw projected
  arc A30 (85.0194, 75.2394) -> (66.7554, 82.9773) centre (62.1124, 46.5952) ccw projected
  arc A31 (85.0194, 75.2394) -> (87.9169, 73.7249) centre (90.3437, 81.8972) ccw projected
  line L8 (87.9169, 73.7249) -> (92.6989, 72.3049) projected
  arc A32 (93.9266, 71.8696) -> (92.6989, 72.3049) centre (89.1334, 60.2981) ccw projected
  line L9 (61.7006, 97.7286) -> (93.9266, 71.8696) projected
  arc A33 (61.7006, 97.7286) -> (50.6268, 86.1987) centre (56.6782, 91.4695) ccw projected
  line L10 (64.3325, 70.4633) -> (50.6268, 86.1987) projected
  line L11 (79.2604, 53.3248) -> (64.3325, 70.4633) projected
  arc A34 (79.3697, 53.1725) -> (79.2604, 53.3248) centre (78.5063, 52.668) ccw projected
  line L12 (86.5144, 40.9457) -> (79.3697, 53.1725) projected
  arc A35 (86.5144, 40.9457) -> (87.5386, 39.6454) centre (91.6947, 43.9728) ccw projected
  line L13 (105.5692, 22.328) -> (87.5386, 39.6454) projected
  arc A36 (105.5692, 22.328) -> (111.1188, 32.4913) centre (109.7254, 26.6553) ccw projected
  arc A37 (110.3596, 33.3335) -> (111.1188, 32.4913) centre (111.3511, 33.464) ccw projected
  line L14 (109.9772, 36.2396) -> (110.3596, 33.3335) projected
  arc A38 (110.4927, 37.2495) -> (109.9772, 36.2396) centre (110.9687, 36.37) ccw projected
  arc A39 (110.4927, 37.2495) -> (107.5312, 48.5254) centre (107.6371, 42.5263) ccw projected
  arc A40 (106.5859, 49.1517) -> (107.5312, 48.5254) centre (107.5135, 49.5253) ccw projected
  line L15 (100.2878, 64.7903) -> (106.5859, 49.1517) projected
  arc A41 (100.2878, 64.7903) -> (96.6592, 69.6769) centre (89.1334, 60.2981) ccw projected
  line L16 (93.9266, 71.8696) -> (96.6592, 69.6769) projected
  circle A42 centre (89.1334, 60.2981) radius 8.025 projected
  circle A43 centre (109.7254, 26.6553) radius 3.025 projected
  circle A44 centre (107.6371, 42.5263) radius 3.025 projected
  circle A45 centre (91.6947, 43.9728) radius 3.025 projected
  point P0 (0, 0)
extrude "押し出し4" add sketch "スケッチ2" along normal blind 0.25 contours L10 A33 L9 A32 L8 A31 A30 A29 L7
chamfer "面取り1" distance 1.75 angle 45 2 edges at (68.955, 79.5364, -3) (56.6782, 92.9695, -3)
properties part number "アーム 中間節(ミラー)" material "アルミニウム 7075"
